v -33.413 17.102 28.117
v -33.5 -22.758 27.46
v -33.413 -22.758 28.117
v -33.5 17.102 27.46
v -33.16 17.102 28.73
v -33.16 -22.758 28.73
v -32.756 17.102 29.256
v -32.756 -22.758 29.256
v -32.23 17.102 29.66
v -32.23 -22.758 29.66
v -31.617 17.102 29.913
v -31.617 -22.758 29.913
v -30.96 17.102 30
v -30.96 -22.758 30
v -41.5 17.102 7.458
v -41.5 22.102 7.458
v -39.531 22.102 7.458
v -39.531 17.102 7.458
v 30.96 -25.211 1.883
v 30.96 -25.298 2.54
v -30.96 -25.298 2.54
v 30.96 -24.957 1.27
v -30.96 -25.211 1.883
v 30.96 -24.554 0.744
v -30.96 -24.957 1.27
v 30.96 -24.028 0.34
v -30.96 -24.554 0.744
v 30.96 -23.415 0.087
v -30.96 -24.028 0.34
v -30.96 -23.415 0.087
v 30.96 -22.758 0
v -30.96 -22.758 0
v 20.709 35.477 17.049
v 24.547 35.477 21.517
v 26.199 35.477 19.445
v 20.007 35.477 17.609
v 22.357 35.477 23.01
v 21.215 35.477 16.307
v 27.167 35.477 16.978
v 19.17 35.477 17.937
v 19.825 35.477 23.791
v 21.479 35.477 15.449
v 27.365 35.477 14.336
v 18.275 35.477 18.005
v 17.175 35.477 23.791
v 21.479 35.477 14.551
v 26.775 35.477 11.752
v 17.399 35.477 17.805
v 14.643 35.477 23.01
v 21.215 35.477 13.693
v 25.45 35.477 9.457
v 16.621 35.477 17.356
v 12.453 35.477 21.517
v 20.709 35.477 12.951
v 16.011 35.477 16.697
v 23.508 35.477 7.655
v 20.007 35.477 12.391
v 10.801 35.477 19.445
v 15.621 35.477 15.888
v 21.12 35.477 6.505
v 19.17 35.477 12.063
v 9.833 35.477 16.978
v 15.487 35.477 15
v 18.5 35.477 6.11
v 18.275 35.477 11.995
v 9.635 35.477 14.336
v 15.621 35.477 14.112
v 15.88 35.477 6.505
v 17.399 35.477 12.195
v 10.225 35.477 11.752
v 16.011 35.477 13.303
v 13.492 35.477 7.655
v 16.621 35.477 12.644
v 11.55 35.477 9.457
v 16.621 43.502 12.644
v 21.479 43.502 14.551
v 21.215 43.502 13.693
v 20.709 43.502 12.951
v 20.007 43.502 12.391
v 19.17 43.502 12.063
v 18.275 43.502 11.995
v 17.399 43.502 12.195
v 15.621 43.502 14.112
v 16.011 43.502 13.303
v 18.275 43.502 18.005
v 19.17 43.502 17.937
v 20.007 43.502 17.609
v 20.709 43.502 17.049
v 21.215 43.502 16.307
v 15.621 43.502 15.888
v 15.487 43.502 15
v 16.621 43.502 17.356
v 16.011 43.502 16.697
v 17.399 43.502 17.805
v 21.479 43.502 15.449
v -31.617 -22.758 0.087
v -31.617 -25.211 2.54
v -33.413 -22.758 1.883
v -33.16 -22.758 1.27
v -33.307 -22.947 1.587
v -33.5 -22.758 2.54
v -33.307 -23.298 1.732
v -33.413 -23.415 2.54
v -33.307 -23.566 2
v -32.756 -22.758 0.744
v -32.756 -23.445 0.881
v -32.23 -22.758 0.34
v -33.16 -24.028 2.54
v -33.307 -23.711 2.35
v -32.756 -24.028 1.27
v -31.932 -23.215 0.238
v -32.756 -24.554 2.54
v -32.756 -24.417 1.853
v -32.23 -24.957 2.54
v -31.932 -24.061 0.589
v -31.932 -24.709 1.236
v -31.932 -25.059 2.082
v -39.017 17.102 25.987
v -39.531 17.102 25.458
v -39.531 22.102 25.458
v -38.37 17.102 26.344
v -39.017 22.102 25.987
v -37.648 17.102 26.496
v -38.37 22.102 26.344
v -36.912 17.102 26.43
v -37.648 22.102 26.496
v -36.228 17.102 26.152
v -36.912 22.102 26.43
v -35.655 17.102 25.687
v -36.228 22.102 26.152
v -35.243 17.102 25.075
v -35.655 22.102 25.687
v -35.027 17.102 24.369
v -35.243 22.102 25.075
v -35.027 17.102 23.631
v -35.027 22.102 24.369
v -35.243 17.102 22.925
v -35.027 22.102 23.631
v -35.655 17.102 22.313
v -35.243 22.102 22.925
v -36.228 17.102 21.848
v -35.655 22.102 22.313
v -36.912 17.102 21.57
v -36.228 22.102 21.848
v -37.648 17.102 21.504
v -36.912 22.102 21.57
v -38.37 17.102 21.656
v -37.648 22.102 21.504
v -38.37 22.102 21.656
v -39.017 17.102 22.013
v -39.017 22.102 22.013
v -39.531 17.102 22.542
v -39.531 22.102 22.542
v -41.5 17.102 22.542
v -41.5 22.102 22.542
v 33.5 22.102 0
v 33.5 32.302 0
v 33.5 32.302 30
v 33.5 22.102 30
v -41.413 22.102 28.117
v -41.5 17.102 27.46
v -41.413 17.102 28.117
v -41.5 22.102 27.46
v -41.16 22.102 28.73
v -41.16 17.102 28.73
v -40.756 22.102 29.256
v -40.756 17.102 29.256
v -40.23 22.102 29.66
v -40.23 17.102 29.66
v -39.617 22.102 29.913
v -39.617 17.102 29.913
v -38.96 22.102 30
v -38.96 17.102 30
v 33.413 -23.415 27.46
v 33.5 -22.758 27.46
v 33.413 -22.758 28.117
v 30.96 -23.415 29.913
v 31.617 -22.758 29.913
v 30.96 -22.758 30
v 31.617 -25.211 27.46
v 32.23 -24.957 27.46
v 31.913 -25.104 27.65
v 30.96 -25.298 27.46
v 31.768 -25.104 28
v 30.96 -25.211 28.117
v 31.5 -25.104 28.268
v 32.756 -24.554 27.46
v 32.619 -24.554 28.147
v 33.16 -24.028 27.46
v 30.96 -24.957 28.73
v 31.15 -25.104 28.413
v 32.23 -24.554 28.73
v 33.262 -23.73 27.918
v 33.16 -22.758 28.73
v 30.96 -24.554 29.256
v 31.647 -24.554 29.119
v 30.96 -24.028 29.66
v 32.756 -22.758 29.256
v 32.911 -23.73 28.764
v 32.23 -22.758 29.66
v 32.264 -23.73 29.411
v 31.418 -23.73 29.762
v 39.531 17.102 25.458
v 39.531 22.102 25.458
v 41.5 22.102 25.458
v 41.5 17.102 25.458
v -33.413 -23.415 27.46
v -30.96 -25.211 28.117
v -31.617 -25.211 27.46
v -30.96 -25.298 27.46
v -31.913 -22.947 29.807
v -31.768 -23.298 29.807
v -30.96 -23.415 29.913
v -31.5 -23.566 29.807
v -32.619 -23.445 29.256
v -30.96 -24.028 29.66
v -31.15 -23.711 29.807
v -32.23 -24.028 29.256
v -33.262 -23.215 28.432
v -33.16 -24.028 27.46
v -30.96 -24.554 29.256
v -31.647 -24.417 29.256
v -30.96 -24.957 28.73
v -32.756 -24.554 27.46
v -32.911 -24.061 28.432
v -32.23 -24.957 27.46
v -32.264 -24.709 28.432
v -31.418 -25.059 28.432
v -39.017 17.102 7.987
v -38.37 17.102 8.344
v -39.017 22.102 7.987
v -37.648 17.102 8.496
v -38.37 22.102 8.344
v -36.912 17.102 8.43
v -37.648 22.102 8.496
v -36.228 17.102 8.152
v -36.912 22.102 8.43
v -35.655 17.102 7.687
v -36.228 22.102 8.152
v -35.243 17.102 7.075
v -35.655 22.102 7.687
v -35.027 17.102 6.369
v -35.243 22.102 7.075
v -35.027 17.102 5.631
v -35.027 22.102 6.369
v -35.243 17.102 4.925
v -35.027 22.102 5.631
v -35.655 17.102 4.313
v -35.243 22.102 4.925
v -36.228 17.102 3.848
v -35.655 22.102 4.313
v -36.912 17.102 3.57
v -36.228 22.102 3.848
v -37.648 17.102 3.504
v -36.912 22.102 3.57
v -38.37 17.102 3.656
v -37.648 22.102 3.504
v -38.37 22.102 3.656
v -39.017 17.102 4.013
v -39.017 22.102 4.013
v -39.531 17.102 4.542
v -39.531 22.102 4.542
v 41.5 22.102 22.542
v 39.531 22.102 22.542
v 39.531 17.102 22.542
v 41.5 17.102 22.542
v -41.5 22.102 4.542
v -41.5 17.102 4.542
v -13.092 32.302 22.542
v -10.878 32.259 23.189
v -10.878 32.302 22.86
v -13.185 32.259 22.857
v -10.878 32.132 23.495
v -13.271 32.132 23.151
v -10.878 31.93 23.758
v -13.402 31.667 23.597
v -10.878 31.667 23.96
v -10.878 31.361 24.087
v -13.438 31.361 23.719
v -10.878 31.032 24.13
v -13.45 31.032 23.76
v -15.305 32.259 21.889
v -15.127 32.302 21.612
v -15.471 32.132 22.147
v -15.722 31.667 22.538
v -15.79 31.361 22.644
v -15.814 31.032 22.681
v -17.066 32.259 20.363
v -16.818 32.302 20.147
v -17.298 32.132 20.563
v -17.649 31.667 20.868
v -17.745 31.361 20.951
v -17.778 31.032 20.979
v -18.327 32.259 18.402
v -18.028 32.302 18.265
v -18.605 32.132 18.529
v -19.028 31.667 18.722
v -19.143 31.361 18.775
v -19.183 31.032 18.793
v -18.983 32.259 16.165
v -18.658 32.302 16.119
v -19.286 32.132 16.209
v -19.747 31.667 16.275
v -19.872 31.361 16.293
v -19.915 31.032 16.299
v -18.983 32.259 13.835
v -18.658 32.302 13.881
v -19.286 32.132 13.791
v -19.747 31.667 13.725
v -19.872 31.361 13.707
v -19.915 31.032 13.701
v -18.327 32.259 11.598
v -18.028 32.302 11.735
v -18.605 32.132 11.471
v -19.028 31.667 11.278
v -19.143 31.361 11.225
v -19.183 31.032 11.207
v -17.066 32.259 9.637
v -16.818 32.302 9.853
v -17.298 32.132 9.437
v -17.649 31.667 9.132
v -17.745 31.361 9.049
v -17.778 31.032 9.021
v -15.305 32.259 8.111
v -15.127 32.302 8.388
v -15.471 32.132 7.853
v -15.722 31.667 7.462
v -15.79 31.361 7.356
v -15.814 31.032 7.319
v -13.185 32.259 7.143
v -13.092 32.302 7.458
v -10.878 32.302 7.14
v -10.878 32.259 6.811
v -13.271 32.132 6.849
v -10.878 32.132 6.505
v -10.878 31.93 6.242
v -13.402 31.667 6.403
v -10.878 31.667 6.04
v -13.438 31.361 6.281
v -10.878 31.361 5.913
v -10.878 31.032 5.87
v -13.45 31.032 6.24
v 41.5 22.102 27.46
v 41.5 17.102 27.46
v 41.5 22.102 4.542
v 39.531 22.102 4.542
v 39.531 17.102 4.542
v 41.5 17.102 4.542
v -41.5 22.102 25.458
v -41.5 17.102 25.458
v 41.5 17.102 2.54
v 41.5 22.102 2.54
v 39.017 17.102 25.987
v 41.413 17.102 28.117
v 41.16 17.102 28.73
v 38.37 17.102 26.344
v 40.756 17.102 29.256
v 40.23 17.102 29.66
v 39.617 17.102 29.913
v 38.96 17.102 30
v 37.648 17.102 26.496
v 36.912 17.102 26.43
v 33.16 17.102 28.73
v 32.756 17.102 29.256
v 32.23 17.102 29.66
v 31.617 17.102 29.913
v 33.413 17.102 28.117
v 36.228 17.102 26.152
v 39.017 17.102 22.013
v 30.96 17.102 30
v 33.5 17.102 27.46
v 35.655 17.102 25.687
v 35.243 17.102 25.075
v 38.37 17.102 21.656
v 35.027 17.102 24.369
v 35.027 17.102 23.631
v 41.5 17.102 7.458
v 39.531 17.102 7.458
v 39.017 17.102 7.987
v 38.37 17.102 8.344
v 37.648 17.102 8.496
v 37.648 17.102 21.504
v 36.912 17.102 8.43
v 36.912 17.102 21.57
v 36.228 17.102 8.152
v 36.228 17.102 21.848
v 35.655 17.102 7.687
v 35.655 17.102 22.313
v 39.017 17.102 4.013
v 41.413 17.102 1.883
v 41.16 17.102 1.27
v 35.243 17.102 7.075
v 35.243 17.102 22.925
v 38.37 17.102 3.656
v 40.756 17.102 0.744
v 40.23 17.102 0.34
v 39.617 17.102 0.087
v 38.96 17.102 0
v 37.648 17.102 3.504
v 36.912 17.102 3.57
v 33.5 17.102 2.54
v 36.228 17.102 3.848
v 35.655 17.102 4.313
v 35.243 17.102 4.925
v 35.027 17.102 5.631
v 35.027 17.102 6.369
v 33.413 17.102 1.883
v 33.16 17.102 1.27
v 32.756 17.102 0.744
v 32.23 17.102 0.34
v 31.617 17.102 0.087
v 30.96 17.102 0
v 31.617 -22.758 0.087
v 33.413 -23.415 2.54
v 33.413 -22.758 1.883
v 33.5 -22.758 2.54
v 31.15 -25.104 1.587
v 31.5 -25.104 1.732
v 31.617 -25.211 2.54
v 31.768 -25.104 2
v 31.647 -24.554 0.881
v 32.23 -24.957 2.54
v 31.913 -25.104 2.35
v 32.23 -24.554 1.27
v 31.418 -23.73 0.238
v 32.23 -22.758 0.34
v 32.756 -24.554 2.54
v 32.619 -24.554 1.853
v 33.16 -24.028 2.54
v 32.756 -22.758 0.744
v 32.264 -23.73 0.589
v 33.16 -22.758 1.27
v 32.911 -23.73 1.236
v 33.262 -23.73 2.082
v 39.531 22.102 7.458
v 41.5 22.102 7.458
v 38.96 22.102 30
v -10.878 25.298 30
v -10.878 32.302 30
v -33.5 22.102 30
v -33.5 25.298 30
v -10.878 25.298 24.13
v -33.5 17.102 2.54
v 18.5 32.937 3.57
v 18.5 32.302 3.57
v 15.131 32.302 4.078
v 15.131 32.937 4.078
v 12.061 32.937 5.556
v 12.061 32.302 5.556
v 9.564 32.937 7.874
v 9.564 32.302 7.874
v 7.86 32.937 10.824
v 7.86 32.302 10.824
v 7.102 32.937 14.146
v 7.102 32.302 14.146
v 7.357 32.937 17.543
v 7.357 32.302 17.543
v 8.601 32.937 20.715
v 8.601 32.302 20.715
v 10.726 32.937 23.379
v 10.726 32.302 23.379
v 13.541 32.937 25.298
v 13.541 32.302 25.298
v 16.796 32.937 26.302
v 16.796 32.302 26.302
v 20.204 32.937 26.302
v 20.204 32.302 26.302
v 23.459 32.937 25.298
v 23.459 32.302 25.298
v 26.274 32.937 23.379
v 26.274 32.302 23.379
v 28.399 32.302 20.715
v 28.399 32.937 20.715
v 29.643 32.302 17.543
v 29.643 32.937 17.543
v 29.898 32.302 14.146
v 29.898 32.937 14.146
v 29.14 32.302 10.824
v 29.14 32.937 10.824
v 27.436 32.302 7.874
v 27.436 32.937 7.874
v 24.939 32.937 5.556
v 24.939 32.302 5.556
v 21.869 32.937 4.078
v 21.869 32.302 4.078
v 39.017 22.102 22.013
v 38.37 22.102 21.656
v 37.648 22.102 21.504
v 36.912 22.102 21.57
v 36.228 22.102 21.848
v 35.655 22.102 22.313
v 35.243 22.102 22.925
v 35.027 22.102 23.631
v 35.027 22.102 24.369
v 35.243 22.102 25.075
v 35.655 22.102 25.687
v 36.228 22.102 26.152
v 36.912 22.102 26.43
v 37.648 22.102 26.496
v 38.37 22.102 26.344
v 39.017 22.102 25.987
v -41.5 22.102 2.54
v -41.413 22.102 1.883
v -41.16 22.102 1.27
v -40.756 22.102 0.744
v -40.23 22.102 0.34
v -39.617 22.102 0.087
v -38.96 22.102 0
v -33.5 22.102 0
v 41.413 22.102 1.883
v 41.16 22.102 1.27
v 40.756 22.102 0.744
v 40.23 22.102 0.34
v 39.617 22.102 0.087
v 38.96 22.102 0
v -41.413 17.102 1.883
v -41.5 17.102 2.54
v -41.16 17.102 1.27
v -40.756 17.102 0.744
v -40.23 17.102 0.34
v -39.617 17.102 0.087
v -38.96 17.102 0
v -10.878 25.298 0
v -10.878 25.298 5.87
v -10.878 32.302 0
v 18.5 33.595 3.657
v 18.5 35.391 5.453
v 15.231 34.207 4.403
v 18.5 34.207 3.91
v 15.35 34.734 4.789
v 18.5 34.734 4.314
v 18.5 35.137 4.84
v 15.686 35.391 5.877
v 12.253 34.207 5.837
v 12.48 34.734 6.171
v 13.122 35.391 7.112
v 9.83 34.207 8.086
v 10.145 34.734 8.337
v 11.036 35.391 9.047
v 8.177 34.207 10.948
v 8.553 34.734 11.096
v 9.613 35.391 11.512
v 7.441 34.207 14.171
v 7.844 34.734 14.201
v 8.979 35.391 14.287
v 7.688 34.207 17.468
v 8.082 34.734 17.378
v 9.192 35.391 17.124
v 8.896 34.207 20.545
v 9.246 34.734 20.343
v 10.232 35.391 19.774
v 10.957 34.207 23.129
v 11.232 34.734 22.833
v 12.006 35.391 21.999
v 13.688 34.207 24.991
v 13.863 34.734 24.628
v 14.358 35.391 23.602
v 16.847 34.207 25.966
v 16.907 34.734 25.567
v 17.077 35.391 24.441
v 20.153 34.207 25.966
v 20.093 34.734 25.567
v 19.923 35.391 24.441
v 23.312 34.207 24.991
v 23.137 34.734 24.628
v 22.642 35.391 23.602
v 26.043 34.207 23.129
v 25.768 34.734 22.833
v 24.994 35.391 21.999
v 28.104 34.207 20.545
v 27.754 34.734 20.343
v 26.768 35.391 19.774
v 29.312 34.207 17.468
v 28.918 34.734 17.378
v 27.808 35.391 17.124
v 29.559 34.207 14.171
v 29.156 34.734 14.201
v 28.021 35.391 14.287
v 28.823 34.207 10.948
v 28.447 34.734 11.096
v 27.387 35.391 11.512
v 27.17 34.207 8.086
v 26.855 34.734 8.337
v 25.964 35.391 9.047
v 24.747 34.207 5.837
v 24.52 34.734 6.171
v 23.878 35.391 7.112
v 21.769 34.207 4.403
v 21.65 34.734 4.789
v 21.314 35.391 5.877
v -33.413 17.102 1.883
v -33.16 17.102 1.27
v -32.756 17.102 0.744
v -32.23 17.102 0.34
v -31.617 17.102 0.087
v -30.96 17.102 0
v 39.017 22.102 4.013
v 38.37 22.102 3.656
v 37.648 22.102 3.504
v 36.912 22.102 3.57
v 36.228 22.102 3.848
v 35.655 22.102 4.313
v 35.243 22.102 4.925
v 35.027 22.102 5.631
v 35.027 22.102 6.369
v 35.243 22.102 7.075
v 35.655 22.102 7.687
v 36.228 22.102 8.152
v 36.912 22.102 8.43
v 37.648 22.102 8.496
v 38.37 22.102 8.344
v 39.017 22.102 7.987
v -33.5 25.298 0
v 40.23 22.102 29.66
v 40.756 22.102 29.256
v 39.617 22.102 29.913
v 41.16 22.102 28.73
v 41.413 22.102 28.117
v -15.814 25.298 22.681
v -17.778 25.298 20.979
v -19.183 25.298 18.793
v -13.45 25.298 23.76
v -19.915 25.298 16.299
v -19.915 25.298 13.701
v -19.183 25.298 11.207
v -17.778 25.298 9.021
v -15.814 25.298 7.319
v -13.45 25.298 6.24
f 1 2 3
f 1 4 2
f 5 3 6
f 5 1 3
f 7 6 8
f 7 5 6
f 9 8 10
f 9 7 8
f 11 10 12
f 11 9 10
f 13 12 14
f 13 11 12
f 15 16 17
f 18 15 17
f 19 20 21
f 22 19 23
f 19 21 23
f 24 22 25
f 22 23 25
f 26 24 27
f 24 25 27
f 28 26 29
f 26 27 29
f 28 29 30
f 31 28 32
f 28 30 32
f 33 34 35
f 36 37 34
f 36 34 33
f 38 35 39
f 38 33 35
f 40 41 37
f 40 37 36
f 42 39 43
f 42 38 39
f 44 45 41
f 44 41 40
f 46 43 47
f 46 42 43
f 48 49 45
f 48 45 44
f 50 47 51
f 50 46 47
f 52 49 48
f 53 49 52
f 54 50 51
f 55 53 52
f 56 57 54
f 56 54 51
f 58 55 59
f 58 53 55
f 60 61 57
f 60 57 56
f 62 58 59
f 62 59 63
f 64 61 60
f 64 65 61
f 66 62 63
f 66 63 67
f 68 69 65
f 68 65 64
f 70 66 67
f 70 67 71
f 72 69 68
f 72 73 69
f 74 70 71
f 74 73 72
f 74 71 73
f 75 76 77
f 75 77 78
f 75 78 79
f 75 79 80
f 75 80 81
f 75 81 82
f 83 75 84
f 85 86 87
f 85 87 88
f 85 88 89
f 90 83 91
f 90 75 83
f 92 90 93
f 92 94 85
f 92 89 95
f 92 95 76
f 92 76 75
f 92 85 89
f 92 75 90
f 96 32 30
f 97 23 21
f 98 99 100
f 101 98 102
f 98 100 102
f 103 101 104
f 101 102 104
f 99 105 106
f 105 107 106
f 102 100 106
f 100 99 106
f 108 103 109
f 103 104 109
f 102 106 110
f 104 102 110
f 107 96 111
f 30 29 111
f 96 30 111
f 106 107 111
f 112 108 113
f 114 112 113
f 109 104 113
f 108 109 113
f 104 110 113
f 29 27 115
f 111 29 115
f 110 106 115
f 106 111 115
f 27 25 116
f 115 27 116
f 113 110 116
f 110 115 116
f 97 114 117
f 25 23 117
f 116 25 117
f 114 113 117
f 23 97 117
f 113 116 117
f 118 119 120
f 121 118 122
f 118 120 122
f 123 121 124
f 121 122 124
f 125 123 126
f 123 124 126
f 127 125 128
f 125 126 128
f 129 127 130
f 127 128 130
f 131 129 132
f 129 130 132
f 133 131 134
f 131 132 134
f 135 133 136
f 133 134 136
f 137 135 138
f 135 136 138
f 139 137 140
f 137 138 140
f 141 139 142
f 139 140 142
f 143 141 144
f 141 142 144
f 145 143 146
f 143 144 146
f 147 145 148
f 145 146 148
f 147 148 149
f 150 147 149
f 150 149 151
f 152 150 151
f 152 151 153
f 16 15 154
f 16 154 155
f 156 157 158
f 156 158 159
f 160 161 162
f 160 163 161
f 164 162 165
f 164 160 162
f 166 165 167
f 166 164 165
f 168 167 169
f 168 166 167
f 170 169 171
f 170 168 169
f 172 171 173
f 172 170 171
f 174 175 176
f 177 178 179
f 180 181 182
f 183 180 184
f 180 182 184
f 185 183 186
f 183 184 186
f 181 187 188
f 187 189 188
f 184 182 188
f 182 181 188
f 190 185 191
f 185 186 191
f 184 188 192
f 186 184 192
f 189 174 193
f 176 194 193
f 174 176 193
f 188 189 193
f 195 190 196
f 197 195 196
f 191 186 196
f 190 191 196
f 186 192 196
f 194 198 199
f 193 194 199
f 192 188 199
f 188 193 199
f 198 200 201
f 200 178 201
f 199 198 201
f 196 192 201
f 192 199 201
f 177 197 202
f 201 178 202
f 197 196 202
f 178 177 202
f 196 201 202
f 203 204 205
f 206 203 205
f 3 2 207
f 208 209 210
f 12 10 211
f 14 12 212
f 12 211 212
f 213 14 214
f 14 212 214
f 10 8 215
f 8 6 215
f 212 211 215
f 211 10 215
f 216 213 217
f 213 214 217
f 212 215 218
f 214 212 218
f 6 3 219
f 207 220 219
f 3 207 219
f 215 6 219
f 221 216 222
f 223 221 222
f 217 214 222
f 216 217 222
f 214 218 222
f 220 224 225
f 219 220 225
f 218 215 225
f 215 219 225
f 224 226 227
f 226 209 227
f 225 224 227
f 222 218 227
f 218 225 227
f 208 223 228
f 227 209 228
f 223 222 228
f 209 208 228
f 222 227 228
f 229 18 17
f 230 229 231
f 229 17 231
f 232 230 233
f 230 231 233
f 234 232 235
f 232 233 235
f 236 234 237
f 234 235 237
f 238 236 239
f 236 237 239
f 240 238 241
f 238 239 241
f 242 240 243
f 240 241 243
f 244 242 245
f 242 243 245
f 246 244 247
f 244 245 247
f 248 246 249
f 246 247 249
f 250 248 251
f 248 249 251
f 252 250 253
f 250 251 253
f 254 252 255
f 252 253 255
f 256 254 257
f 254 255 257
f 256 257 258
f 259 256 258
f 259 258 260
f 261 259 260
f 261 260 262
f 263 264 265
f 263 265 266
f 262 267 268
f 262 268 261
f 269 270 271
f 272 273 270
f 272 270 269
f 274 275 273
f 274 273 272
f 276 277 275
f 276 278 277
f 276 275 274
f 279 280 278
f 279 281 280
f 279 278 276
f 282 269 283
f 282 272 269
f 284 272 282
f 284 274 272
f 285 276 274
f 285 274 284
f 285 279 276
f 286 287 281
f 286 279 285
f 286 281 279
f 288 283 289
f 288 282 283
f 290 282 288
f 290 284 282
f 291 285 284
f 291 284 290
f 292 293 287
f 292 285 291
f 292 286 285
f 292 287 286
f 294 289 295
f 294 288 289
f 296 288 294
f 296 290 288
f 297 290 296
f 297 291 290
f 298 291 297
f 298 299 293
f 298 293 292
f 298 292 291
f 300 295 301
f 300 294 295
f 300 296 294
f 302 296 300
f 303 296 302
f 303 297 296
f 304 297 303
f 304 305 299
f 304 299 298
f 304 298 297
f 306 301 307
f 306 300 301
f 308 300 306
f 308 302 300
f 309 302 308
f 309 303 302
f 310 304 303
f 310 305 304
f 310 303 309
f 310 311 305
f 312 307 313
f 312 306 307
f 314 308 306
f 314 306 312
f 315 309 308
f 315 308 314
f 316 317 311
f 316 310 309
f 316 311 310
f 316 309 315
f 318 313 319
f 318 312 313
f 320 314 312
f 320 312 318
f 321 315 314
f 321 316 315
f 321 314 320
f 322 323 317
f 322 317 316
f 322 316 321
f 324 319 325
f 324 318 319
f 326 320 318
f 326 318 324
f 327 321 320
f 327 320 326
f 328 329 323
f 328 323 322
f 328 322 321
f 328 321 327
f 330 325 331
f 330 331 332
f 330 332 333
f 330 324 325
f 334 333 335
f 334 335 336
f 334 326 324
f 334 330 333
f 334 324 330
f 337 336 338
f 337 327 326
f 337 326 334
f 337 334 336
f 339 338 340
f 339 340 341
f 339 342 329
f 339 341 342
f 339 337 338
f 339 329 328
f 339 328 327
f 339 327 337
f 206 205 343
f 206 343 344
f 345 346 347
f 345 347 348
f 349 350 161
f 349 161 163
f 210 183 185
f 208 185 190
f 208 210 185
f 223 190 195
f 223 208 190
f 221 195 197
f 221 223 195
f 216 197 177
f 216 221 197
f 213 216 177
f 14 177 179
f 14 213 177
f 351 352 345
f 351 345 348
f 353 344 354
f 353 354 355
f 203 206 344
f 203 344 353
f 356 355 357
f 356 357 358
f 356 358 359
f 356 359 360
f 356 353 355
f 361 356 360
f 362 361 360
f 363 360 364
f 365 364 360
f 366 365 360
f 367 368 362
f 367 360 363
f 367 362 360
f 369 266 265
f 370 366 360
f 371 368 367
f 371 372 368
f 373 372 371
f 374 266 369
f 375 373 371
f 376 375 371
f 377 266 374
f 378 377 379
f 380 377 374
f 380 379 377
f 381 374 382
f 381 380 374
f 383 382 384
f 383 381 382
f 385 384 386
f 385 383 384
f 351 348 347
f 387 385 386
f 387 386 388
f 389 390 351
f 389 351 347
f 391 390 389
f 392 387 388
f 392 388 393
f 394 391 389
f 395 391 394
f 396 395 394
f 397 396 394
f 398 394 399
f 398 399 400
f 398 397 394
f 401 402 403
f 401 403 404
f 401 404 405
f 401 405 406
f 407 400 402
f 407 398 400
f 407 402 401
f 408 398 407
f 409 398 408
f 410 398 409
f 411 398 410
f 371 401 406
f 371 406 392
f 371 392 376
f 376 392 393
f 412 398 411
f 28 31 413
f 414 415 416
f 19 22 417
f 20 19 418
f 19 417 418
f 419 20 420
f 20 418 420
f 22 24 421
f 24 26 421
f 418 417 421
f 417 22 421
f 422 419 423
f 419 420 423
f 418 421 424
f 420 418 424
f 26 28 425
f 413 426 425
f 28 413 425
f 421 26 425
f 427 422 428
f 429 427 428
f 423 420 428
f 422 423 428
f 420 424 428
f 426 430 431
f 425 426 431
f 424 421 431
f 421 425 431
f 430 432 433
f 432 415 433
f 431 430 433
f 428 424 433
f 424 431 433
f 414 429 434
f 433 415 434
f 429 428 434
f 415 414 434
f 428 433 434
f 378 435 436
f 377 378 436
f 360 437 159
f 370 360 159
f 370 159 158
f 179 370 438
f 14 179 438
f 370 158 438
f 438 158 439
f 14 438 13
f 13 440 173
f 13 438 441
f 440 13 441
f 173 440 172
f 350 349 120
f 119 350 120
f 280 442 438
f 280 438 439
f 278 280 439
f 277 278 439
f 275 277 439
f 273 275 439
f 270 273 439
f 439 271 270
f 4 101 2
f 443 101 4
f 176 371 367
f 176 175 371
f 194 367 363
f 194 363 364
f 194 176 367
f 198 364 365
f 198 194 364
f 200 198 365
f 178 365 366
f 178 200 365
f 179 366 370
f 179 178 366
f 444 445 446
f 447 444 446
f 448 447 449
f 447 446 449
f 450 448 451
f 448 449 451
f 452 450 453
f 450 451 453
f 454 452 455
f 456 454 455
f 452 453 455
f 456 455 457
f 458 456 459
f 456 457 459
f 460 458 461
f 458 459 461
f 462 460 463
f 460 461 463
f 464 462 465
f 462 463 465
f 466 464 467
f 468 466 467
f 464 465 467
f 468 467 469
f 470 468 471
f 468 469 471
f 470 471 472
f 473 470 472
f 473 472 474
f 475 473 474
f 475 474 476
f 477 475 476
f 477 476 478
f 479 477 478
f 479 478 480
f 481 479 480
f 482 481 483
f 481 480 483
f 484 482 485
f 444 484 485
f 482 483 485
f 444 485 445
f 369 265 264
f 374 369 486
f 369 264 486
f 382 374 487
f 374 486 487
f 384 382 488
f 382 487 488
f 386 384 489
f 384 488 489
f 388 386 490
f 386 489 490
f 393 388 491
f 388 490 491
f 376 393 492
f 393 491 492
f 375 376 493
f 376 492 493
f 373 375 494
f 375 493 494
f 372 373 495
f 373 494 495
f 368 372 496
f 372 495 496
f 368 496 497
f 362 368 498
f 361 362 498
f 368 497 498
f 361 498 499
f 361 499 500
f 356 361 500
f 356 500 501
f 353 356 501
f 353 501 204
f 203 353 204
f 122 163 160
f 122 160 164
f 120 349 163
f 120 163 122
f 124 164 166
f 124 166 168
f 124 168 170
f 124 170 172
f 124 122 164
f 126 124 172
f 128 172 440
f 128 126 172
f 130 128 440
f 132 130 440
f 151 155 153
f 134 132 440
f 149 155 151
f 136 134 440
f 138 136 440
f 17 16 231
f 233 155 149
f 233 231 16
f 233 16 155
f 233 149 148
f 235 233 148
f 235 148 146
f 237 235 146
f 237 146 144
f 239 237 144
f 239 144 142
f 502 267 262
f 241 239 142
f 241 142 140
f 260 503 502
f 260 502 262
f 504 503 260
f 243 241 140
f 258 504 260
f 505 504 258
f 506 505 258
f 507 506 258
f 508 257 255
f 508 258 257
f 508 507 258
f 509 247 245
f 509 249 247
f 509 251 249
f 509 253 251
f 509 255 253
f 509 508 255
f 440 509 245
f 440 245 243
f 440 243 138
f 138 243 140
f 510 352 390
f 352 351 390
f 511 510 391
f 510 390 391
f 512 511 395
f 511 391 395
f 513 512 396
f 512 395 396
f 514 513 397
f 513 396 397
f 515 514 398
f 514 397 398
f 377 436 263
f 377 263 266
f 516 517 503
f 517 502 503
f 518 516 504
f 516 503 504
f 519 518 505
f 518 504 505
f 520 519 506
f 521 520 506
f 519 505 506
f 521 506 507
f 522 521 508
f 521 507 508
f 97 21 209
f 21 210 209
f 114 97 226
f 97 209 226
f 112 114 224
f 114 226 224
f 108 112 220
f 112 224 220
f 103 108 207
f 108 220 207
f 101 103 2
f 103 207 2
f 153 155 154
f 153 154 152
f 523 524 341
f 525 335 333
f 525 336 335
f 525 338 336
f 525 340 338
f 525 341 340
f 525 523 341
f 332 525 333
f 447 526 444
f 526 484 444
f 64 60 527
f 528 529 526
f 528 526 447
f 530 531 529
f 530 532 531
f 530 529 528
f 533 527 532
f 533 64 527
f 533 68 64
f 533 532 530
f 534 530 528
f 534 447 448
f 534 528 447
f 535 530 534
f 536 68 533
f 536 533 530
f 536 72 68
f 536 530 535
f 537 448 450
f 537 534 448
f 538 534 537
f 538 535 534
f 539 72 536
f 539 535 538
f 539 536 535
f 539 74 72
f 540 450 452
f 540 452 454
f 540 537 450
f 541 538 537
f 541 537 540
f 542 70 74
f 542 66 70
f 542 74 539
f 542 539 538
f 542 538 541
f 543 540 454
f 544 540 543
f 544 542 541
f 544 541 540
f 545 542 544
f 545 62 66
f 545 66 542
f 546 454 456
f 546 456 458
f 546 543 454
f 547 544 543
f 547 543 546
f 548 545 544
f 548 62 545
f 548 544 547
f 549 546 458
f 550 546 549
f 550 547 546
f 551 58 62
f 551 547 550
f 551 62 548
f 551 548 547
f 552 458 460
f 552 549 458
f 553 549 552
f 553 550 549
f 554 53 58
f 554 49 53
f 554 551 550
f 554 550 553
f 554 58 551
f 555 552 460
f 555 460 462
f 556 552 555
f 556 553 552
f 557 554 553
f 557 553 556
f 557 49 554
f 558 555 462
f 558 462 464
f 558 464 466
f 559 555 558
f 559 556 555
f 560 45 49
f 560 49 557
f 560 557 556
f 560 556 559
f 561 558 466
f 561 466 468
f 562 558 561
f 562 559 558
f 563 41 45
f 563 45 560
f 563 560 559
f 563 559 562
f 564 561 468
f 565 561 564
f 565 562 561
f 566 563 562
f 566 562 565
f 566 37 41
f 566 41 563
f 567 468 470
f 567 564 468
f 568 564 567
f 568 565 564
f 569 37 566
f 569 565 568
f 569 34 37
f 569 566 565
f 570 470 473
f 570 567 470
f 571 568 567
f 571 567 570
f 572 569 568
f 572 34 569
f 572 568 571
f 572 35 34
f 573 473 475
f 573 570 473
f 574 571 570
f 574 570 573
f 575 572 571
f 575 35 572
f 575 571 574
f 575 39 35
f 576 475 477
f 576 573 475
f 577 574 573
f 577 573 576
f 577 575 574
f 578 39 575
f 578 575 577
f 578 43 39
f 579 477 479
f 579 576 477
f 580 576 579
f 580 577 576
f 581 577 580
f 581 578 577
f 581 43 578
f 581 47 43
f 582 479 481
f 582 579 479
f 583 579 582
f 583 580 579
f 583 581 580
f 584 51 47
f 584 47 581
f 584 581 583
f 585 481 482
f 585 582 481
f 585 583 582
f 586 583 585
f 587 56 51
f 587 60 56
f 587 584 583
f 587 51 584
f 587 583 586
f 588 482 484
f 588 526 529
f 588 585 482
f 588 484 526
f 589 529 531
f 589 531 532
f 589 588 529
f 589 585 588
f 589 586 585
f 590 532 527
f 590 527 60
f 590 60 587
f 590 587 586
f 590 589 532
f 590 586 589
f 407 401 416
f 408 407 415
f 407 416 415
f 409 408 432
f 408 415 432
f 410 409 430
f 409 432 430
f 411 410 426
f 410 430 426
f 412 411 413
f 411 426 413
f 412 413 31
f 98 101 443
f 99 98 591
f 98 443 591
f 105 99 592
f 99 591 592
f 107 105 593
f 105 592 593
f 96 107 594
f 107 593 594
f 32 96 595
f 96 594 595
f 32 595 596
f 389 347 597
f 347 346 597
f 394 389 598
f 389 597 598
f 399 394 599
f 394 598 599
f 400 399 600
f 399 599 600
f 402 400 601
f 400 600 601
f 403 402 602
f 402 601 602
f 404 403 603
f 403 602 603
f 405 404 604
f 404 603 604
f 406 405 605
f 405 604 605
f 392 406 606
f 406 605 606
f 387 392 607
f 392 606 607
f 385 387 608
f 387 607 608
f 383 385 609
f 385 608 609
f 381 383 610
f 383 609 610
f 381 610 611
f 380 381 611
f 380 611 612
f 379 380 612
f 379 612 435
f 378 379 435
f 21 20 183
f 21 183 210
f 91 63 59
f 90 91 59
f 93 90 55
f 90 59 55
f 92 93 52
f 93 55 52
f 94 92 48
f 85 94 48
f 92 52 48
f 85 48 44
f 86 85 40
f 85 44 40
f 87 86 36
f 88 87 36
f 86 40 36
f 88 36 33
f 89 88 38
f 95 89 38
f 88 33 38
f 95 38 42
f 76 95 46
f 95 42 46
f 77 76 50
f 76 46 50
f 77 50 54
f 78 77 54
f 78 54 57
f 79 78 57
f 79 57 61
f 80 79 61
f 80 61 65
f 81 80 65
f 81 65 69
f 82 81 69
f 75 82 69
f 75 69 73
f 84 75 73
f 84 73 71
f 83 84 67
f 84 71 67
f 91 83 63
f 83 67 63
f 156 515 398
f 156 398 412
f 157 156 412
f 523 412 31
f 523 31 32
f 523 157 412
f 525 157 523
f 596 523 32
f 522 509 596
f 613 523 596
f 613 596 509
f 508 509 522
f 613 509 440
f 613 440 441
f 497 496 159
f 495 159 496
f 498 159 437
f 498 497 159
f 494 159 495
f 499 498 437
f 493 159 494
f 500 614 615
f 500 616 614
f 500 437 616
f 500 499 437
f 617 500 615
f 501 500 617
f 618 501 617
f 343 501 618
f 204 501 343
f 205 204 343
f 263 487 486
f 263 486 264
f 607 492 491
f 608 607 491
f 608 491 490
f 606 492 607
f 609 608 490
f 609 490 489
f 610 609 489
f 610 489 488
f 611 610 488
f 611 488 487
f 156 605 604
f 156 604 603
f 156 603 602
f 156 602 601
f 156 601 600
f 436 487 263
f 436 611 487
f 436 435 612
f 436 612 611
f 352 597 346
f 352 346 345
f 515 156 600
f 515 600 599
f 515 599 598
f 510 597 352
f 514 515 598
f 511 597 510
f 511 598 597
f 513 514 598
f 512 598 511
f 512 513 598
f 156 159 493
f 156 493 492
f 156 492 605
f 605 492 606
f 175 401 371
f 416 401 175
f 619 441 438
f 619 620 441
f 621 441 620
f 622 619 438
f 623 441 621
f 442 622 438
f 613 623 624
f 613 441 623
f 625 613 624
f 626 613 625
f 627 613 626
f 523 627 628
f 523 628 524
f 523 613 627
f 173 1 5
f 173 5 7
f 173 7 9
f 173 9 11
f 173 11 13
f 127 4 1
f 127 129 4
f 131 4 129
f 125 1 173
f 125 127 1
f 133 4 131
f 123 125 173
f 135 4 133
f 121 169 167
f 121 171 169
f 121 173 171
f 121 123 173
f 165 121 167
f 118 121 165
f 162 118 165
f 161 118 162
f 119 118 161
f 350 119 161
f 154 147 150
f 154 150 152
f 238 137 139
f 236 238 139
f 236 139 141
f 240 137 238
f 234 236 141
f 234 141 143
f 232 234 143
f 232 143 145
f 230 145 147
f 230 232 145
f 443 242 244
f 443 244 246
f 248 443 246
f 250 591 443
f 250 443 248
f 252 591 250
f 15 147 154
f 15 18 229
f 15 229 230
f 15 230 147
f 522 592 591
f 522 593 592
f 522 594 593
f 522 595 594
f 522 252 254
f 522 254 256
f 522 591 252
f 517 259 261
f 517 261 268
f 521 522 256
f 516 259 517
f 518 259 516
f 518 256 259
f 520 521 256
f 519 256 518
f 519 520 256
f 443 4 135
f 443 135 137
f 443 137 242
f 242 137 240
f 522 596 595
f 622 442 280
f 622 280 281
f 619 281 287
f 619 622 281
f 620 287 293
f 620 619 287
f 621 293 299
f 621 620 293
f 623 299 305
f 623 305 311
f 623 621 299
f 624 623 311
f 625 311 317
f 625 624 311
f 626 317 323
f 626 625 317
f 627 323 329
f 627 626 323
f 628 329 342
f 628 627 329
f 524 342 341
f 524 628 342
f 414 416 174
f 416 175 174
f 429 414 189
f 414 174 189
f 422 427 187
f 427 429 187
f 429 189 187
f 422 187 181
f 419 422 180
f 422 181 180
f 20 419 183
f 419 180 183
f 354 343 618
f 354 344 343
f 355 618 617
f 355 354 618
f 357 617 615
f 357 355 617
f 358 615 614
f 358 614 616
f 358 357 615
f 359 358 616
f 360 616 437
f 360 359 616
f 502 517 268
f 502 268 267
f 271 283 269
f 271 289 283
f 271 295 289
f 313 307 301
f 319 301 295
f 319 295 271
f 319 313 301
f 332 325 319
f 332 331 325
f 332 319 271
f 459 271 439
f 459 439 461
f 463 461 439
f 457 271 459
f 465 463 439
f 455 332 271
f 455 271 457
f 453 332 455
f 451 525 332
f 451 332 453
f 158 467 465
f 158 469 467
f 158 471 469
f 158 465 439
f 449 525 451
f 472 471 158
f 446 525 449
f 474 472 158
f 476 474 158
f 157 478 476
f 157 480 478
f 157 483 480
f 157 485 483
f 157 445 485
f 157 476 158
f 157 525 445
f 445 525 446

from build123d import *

# Parameters (mm, degrees)
EXTRUDE1_DEPTH     = 30
FILLET1_R          = 2.54
CUT_EXTRUDE1_REACH = 71.778
SKETCH2_R          = 2.5
CUT_EXTRUDE2_REACH = 71.778
SKETCH3_W          = 3.948997199
SKETCH3_H          = 2.915862496
SKETCH3_W_2        = 5.260004778
SKETCH3_W_3        = 4.51085759
EXTRUDE2_DEPTH     = 7.004916842
SKETCH5_R          = 11.43
EXTRUDE3_DEPTH     = 3.175
FILLET2_R          = 2.54
FILLET3_R          = 1.27
SKETCH6_R          = 3.013004542
EXTRUDE4_DEPTH     = 8.025


with BuildPart() as part:
    # Sketch1 → Extrude1 (new body)
    with BuildSketch(Plane.XY):
        Polygon((-33.5, 17.102458421), (-41.5, 17.102458421), (-41.5, 22.102458421), (-33.5, 22.102458421), (-33.5, 25.297541579), (-10.877689124, 25.297541579), (-10.877689124, 32.302458421), (33.5, 32.302458421), (33.5, 22.102458421), (41.5, 22.102458421), (41.5, 17.102458421), (33.5, 17.102458421), (33.5, -25.297541579), (-33.5, -25.297541579), align=None)
    extrude(amount=EXTRUDE1_DEPTH)

    # Fillet1
    fillet1_edges = [part.edges().sort_by_distance(p)[0] for p in [
        (33.5, -4.097541579, 30),
        (-41.5, 19.602458421, 0),
        (41.5, 19.602458421, 30),
        (41.5, 19.602458421, 0),
        (33.5, -4.097541579, 0),
        (0, -25.297541579, 0),
        (-33.5, -4.097541579, 0),
        (33.5, -25.297541579, 15),
        (-33.5, -25.297541579, 15),
        (-33.5, -4.097541579, 30),
        (-41.5, 19.602458421, 30),
        (0, -25.297541579, 30),
    ]]
    fillet(fillet1_edges, radius=FILLET1_R)

    # Sketch2 → Cut-Extrude1 (cut, up to next)
    with BuildSketch(Plane(origin=(0, 22.102458421, 0), x_dir=(1, 0, 0), z_dir=(0, 1, 0)), mode=Mode.PRIVATE) as cut_extrude1_sk1:
        with Locations(Location((-37.5, -6, 0), (0, 0, 270))):
            Circle(SKETCH2_R)
    cut_extrude1_tool1 = extrude(cut_extrude1_sk1.sketch, amount=-CUT_EXTRUDE1_REACH, mode=Mode.PRIVATE) & part.part
    # Sketch2 → Cut-Extrude1 (cut, up to next)
    with BuildSketch(Plane(origin=(0, 22.102458421, 0), x_dir=(1, 0, 0), z_dir=(0, 1, 0)), mode=Mode.PRIVATE) as cut_extrude1_sk2:
        with Locations(Location((-37.5, -24, 0), (0, 0, 270))):
            Circle(SKETCH2_R)
    cut_extrude1_tool2 = extrude(cut_extrude1_sk2.sketch, amount=-CUT_EXTRUDE1_REACH, mode=Mode.PRIVATE) & part.part
    # Sketch2 → Cut-Extrude1 (cut, up to next)
    with BuildSketch(Plane(origin=(0, 22.102458421, 0), x_dir=(1, 0, 0), z_dir=(0, 1, 0)), mode=Mode.PRIVATE) as cut_extrude1_sk3:
        with Locations(Location((37.5, -6, 0), (0, 0, 270))):
            Circle(SKETCH2_R)
    cut_extrude1_tool3 = extrude(cut_extrude1_sk3.sketch, amount=-CUT_EXTRUDE1_REACH, mode=Mode.PRIVATE) & part.part
    # Sketch2 → Cut-Extrude1 (cut, up to next)
    with BuildSketch(Plane(origin=(0, 22.102458421, 0), x_dir=(1, 0, 0), z_dir=(0, 1, 0)), mode=Mode.PRIVATE) as cut_extrude1_sk4:
        with Locations(Location((37.5, -24, 0), (0, 0, 270))):
            Circle(SKETCH2_R)
    cut_extrude1_tool4 = extrude(cut_extrude1_sk4.sketch, amount=-CUT_EXTRUDE1_REACH, mode=Mode.PRIVATE) & part.part
    add(cut_extrude1_tool1.solids().sort_by_distance((-37.5, 22.102458, 6))[0], mode=Mode.SUBTRACT)
    add(cut_extrude1_tool2.solids().sort_by_distance((-37.5, 22.102458, 24))[0], mode=Mode.SUBTRACT)
    add(cut_extrude1_tool3.solids().sort_by_distance((37.5, 22.102458, 6))[0], mode=Mode.SUBTRACT)
    add(cut_extrude1_tool4.solids().sort_by_distance((37.5, 22.102458, 24))[0], mode=Mode.SUBTRACT)

    # Sketch3 → Cut-Extrude2 (cut, up to next)
    with BuildSketch(Plane(origin=(0, 22.102458421, 0), x_dir=(1, 0, 0), z_dir=(0, 1, 0)), mode=Mode.PRIVATE) as cut_extrude2_sk1:
        with Locations((-39.525501401, -6)):
            Rectangle(SKETCH3_W, SKETCH3_H)
    cut_extrude2_tool1 = extrude(cut_extrude2_sk1.sketch, amount=-CUT_EXTRUDE2_REACH, mode=Mode.PRIVATE) & part.part
    # Sketch3 → Cut-Extrude2 (cut, up to next)
    with BuildSketch(Plane(origin=(0, 22.102458421, 0), x_dir=(1, 0, 0), z_dir=(0, 1, 0)), mode=Mode.PRIVATE) as cut_extrude2_sk2:
        with Locations((-39.525501401, -24)):
            Rectangle(SKETCH3_W, SKETCH3_H)
    cut_extrude2_tool2 = extrude(cut_extrude2_sk2.sketch, amount=-CUT_EXTRUDE2_REACH, mode=Mode.PRIVATE) & part.part
    # Sketch3 → Cut-Extrude2 (cut, up to next)
    with BuildSketch(Plane(origin=(0, 22.102458421, 0), x_dir=(1, 0, 0), z_dir=(0, 1, 0)), mode=Mode.PRIVATE) as cut_extrude2_sk3:
        with Locations((38.869997611, -6)):
            Rectangle(SKETCH3_W_2, SKETCH3_H)
    cut_extrude2_tool3 = extrude(cut_extrude2_sk3.sketch, amount=-CUT_EXTRUDE2_REACH, mode=Mode.PRIVATE) & part.part
    # Sketch3 → Cut-Extrude2 (cut, up to next)
    with BuildSketch(Plane(origin=(0, 22.102458421, 0), x_dir=(1, 0, 0), z_dir=(0, 1, 0)), mode=Mode.PRIVATE) as cut_extrude2_sk4:
        with Locations((39.244571205, -24)):
            Rectangle(SKETCH3_W_3, SKETCH3_H)
    cut_extrude2_tool4 = extrude(cut_extrude2_sk4.sketch, amount=-CUT_EXTRUDE2_REACH, mode=Mode.PRIVATE) & part.part
    add(cut_extrude2_tool1.solids().sort_by_distance((-39.525501, 22.102458, 6))[0], mode=Mode.SUBTRACT)
    add(cut_extrude2_tool2.solids().sort_by_distance((-39.525501, 22.102458, 24))[0], mode=Mode.SUBTRACT)
    add(cut_extrude2_tool3.solids().sort_by_distance((38.869998, 22.102458, 6))[0], mode=Mode.SUBTRACT)
    add(cut_extrude2_tool4.solids().sort_by_distance((39.244571, 22.102458, 24))[0], mode=Mode.SUBTRACT)

    # Sketch4 → Extrude2 (add)
    with BuildSketch(Plane(origin=(0, 25.297541579, 0), x_dir=(1, 0, 0), z_dir=(0, 1, 0))):
        with BuildLine():
            Line((-10.877689124, -5.869768646), (-10.877689124, -24.130231354))
            ThreePointArc((-10.877689124, -24.130231354), (-20.007920479, -15), (-10.877689124, -5.869768646))
        make_face()
    extrude(amount=EXTRUDE2_DEPTH)

    # Sketch5 → Extrude3 (add)
    with BuildSketch(Plane(origin=(0, 32.302458421, 0), x_dir=(1, 0, 0), z_dir=(0, 1, 0))):
        with Locations(Location((18.5, -15, 0), (0, 0, 90))):
            Circle(SKETCH5_R)
    extrude(amount=EXTRUDE3_DEPTH)

    # Fillet2
    fillet2_edges = [part.edges().sort_by_distance(p)[0] for p in [
        (18.5, 35.477458421, 26.43),
    ]]
    fillet(fillet2_edges, radius=FILLET2_R)

    # Fillet3
    fillet3_edges = [part.edges().sort_by_distance(p)[0] for p in [
        (-20.007920479, 32.302458421, 15),
    ]]
    fillet(fillet3_edges, radius=FILLET3_R)

    # Sketch6 → Extrude4 (add)
    with BuildSketch(Plane(origin=(0, 35.477458421, 0), x_dir=(1, 0, 0), z_dir=(0, 1, 0))):
        with Locations(Location((18.5, -15, 0), (0, 0, 180))):
            Circle(SKETCH6_R)
    extrude(amount=EXTRUDE4_DEPTH)


solid = part.part
